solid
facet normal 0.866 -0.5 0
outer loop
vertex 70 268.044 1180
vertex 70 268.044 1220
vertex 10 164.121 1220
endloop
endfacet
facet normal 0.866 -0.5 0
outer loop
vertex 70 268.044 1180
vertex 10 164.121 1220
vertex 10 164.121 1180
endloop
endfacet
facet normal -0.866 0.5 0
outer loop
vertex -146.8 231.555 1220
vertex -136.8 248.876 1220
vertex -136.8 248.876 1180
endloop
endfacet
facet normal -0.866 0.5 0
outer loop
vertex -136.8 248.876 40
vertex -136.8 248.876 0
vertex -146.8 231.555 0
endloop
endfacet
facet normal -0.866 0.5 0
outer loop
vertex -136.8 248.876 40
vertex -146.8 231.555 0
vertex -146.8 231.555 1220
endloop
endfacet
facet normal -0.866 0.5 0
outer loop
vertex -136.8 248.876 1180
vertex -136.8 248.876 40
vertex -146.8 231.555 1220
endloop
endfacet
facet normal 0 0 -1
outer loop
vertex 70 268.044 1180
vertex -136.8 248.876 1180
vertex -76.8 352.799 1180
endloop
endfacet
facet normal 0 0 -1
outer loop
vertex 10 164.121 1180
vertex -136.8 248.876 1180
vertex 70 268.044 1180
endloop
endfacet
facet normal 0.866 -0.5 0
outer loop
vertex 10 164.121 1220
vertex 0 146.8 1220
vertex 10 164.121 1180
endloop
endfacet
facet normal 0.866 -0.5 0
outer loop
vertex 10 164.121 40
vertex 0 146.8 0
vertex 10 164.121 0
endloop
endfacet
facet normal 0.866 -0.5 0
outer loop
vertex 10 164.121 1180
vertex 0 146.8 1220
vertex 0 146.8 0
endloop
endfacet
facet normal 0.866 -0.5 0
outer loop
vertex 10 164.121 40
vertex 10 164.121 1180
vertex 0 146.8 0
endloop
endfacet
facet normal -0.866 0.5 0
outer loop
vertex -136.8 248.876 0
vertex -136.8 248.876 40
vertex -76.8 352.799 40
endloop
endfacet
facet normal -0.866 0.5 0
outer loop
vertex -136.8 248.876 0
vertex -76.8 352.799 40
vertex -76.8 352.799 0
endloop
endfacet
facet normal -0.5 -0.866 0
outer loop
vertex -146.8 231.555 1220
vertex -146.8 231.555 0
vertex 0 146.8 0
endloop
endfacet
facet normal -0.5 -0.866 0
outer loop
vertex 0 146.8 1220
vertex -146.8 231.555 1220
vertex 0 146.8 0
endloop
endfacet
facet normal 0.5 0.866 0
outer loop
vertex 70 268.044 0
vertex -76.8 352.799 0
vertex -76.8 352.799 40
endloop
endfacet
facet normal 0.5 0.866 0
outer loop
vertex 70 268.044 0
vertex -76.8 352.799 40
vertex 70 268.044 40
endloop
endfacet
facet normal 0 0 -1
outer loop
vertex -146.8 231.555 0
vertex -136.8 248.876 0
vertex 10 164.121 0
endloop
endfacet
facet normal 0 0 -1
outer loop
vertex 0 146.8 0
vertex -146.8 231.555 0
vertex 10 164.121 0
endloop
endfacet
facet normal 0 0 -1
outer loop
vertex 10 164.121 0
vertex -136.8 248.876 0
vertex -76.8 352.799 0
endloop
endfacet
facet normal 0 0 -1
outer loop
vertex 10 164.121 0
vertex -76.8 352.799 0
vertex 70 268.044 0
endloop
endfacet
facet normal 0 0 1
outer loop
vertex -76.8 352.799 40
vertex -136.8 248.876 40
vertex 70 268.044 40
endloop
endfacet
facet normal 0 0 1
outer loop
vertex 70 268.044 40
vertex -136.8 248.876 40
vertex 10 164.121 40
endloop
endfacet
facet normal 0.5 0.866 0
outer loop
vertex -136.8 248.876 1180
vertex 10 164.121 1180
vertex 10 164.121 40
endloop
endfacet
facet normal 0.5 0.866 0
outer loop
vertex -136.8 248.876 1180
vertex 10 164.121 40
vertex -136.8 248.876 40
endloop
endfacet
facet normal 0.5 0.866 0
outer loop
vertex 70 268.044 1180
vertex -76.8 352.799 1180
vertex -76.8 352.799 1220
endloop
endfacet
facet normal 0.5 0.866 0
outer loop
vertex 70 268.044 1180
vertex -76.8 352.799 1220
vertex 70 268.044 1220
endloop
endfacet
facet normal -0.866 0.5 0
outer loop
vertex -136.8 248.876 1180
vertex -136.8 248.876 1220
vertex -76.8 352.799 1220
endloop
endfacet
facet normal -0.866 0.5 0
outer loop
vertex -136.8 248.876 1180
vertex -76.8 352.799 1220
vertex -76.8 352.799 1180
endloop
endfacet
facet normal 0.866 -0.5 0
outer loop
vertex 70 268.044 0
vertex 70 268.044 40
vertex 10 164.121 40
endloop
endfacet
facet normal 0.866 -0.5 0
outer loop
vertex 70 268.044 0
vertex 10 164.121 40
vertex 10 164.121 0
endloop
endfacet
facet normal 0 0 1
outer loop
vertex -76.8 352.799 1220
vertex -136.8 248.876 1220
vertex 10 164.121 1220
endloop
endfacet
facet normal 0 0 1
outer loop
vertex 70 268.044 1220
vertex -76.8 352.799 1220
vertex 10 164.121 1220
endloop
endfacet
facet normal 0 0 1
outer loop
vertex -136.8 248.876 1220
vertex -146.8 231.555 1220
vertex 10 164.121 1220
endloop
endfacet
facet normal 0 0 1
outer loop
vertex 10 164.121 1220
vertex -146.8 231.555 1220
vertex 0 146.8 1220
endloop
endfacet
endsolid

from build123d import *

# Parameters (mm, degrees)
BOSS_EXTRUDE1_DEPTH = 1220
SKETCH4_W           = 169.510039034
SKETCH4_H           = 40
BOSS_EXTRUDE3_DEPTH = 120


with BuildPart() as part:
    # Sketch1 → Boss-Extrude1 (new body)
    with BuildSketch(Plane.XY):
        Polygon((0, 146.8), (10, 164.120508076), (-136.8, 248.875527593), (-146.8, 231.555019517), align=None)
    extrude(amount=BOSS_EXTRUDE1_DEPTH)

    # Sketch4 → Boss-Extrude3 (add)
    with BuildSketch(Plane(origin=(73.566264638, 127.420508076, 0), x_dir=(0.86602540378444, -0.4999999999999976, 0), z_dir=(0.4999999999999976, 0.86602540378444, 0))):
        with Locations((-158.155019517, -1200)):
            Rectangle(SKETCH4_W, SKETCH4_H)
        with Locations((-158.155019517, -20)):
            Rectangle(SKETCH4_W, SKETCH4_H)
    extrude(amount=BOSS_EXTRUDE3_DEPTH)


solid = part.part
